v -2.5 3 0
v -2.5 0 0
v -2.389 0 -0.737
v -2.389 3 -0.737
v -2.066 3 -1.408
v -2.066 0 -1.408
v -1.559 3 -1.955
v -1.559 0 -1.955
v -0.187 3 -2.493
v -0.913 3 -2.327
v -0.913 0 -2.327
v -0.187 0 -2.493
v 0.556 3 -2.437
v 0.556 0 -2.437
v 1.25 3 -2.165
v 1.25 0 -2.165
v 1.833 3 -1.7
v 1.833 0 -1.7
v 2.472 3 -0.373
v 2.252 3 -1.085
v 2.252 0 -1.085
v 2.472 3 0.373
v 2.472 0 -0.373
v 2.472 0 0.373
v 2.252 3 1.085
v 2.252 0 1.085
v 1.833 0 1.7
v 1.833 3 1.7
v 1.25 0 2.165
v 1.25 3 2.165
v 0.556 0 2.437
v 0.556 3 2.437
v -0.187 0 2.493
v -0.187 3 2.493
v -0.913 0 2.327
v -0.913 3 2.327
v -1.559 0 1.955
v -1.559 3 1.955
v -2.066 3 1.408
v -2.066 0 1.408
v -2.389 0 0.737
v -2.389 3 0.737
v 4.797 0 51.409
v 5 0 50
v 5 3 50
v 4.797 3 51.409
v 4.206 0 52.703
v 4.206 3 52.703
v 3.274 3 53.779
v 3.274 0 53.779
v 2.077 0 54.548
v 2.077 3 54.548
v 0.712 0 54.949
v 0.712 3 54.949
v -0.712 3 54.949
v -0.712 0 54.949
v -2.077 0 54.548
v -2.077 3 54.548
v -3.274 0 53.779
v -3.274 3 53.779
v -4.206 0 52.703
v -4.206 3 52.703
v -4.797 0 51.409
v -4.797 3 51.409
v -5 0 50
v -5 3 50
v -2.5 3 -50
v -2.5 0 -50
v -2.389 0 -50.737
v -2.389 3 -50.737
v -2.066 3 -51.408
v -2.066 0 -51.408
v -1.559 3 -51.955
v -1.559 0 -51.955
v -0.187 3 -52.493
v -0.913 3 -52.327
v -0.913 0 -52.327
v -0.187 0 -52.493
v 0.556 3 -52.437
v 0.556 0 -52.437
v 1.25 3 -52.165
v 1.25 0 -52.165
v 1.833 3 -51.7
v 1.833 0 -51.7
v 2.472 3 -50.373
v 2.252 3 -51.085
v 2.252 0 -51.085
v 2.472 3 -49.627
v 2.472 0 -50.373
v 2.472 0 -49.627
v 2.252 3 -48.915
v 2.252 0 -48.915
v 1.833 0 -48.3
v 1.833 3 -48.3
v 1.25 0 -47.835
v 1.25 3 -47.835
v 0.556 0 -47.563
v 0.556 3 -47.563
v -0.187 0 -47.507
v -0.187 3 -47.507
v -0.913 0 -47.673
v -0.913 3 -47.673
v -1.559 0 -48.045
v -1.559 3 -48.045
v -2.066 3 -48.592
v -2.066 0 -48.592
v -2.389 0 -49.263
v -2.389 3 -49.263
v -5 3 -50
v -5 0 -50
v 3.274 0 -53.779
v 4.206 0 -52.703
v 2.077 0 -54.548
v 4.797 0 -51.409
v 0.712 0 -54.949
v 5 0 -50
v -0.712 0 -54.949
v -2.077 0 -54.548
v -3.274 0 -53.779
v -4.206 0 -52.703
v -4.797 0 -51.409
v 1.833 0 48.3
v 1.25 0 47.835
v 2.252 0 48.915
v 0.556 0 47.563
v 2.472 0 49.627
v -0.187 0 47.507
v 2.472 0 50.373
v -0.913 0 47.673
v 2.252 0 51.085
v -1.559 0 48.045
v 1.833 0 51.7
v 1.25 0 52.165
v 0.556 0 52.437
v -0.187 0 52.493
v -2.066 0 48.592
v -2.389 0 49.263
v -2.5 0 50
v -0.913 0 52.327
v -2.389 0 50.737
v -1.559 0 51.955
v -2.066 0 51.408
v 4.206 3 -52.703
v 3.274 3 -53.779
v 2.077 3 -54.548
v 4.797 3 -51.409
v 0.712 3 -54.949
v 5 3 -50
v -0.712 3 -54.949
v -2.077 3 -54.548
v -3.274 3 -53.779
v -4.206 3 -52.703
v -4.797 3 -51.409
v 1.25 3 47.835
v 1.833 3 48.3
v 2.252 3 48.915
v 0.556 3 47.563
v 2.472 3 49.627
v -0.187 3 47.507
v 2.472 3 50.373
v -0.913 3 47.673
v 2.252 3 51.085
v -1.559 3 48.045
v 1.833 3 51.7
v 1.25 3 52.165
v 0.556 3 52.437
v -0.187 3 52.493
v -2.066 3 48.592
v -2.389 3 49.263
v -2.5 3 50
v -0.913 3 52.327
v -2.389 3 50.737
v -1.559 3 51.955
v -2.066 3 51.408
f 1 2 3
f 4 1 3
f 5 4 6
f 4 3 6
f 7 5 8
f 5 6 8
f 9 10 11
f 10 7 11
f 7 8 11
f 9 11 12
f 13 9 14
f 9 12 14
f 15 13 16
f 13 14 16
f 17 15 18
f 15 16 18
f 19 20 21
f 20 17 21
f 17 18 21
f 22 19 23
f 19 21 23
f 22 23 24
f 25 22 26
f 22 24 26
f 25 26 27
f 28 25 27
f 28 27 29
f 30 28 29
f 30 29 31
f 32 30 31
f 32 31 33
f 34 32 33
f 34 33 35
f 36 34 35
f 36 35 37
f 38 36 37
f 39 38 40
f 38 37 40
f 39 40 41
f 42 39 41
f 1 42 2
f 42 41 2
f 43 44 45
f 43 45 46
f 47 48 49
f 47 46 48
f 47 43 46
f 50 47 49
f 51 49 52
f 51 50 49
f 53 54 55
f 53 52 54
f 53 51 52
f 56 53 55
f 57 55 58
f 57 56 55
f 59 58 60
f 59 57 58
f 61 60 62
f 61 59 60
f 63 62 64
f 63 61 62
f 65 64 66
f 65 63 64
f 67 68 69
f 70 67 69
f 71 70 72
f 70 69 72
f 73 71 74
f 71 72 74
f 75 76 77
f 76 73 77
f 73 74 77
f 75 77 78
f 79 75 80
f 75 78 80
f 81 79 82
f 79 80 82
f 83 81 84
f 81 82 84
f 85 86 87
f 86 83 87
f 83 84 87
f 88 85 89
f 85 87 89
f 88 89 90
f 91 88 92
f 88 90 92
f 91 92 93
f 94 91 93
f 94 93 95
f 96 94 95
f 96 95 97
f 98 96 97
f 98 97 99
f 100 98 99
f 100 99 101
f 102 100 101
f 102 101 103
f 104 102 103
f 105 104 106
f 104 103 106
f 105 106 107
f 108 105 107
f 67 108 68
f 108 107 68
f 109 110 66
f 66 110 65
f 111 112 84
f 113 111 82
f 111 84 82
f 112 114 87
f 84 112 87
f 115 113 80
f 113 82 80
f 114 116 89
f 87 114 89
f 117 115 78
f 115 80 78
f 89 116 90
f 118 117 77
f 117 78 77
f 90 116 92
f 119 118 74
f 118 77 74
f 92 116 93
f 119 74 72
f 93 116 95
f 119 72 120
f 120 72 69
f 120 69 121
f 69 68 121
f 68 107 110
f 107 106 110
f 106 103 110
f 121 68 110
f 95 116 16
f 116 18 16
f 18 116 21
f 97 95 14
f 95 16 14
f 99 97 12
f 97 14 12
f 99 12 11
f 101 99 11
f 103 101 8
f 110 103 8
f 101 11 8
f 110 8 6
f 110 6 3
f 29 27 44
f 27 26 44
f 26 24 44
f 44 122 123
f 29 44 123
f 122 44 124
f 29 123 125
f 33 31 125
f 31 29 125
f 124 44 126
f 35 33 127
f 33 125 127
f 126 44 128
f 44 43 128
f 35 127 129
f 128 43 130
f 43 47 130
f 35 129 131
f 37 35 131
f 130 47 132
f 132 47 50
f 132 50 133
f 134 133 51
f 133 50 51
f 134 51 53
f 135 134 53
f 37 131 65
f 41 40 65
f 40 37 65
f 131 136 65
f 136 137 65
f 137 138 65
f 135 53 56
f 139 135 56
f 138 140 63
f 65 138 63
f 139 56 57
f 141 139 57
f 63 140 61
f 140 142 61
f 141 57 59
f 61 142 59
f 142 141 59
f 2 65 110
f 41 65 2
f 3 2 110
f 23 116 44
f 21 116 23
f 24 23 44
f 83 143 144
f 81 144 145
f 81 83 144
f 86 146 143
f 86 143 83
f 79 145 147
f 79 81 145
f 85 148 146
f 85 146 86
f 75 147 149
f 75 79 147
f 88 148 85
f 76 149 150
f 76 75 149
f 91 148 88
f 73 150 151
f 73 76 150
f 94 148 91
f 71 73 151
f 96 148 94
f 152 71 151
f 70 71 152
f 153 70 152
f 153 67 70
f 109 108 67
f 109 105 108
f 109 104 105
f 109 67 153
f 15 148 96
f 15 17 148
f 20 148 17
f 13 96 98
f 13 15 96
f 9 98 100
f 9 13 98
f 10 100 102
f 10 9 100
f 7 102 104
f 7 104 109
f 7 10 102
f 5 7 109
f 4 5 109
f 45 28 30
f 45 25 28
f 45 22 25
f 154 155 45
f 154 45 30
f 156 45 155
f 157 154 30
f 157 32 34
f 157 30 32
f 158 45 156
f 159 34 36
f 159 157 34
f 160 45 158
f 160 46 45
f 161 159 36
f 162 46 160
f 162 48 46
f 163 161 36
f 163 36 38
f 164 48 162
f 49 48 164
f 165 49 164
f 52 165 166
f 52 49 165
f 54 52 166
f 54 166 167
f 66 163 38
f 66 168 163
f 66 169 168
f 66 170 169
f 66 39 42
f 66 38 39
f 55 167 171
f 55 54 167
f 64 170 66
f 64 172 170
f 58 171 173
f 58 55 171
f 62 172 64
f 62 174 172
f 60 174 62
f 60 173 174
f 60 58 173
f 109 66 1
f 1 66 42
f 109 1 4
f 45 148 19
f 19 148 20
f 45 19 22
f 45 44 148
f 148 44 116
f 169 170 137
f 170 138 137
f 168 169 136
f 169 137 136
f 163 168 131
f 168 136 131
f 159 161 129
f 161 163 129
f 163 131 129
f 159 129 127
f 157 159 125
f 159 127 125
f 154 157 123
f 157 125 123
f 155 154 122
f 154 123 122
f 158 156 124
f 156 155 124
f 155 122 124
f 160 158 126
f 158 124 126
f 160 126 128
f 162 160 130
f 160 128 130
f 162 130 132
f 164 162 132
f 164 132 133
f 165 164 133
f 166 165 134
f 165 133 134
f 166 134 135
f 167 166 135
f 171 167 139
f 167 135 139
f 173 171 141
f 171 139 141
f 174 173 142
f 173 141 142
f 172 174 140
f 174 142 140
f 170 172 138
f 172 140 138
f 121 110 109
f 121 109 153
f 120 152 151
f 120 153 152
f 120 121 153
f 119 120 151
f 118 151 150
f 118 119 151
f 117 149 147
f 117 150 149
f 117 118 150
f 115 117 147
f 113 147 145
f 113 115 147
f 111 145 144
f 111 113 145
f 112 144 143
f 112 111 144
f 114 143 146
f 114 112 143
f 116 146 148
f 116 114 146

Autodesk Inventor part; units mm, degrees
ref_plane "YZ Plane" through (0, 0, 0) normal (1, 0, 0) x (0, 1, 0)
ref_plane "XZ Plane" through (0, 0, 0) normal (0, 1, 0) x (-1, 0, 0)
ref_plane "XY Plane" through (0, 0, 0) normal (0, 0, 1) x (1, 0, 0)
sketch "Sketch1" plane through (0, 0, 0) normal (0, 1, 0) x (-1, 0, 0)
  line L0 (0, 50) -> (0, -50) construction
  line L1 (-5, 50) -> (-5, -50)
  line L2 (5, -50) -> (5, 50)
  arc A0 (5, 50) -> (-5, 50) centre (0, 50) ccw
  arc A1 (-5, -50) -> (5, -50) centre (0, -50) ccw
  circle A2 centre (0, 50) radius 2.5
  circle A3 centre (0, 0) radius 2.5
  circle A4 centre (0, -50) radius 2.5
  dimension "d0" = 50
  dimension "d1" = 10
  dimension "d2" = 5
  dimension "d3" = 5
  dimension "d4" = 5
extrude "Extrusion1" add sketch "Sketch1" along normal blind 3
properties part number "Lazy Tongs beam Long"
